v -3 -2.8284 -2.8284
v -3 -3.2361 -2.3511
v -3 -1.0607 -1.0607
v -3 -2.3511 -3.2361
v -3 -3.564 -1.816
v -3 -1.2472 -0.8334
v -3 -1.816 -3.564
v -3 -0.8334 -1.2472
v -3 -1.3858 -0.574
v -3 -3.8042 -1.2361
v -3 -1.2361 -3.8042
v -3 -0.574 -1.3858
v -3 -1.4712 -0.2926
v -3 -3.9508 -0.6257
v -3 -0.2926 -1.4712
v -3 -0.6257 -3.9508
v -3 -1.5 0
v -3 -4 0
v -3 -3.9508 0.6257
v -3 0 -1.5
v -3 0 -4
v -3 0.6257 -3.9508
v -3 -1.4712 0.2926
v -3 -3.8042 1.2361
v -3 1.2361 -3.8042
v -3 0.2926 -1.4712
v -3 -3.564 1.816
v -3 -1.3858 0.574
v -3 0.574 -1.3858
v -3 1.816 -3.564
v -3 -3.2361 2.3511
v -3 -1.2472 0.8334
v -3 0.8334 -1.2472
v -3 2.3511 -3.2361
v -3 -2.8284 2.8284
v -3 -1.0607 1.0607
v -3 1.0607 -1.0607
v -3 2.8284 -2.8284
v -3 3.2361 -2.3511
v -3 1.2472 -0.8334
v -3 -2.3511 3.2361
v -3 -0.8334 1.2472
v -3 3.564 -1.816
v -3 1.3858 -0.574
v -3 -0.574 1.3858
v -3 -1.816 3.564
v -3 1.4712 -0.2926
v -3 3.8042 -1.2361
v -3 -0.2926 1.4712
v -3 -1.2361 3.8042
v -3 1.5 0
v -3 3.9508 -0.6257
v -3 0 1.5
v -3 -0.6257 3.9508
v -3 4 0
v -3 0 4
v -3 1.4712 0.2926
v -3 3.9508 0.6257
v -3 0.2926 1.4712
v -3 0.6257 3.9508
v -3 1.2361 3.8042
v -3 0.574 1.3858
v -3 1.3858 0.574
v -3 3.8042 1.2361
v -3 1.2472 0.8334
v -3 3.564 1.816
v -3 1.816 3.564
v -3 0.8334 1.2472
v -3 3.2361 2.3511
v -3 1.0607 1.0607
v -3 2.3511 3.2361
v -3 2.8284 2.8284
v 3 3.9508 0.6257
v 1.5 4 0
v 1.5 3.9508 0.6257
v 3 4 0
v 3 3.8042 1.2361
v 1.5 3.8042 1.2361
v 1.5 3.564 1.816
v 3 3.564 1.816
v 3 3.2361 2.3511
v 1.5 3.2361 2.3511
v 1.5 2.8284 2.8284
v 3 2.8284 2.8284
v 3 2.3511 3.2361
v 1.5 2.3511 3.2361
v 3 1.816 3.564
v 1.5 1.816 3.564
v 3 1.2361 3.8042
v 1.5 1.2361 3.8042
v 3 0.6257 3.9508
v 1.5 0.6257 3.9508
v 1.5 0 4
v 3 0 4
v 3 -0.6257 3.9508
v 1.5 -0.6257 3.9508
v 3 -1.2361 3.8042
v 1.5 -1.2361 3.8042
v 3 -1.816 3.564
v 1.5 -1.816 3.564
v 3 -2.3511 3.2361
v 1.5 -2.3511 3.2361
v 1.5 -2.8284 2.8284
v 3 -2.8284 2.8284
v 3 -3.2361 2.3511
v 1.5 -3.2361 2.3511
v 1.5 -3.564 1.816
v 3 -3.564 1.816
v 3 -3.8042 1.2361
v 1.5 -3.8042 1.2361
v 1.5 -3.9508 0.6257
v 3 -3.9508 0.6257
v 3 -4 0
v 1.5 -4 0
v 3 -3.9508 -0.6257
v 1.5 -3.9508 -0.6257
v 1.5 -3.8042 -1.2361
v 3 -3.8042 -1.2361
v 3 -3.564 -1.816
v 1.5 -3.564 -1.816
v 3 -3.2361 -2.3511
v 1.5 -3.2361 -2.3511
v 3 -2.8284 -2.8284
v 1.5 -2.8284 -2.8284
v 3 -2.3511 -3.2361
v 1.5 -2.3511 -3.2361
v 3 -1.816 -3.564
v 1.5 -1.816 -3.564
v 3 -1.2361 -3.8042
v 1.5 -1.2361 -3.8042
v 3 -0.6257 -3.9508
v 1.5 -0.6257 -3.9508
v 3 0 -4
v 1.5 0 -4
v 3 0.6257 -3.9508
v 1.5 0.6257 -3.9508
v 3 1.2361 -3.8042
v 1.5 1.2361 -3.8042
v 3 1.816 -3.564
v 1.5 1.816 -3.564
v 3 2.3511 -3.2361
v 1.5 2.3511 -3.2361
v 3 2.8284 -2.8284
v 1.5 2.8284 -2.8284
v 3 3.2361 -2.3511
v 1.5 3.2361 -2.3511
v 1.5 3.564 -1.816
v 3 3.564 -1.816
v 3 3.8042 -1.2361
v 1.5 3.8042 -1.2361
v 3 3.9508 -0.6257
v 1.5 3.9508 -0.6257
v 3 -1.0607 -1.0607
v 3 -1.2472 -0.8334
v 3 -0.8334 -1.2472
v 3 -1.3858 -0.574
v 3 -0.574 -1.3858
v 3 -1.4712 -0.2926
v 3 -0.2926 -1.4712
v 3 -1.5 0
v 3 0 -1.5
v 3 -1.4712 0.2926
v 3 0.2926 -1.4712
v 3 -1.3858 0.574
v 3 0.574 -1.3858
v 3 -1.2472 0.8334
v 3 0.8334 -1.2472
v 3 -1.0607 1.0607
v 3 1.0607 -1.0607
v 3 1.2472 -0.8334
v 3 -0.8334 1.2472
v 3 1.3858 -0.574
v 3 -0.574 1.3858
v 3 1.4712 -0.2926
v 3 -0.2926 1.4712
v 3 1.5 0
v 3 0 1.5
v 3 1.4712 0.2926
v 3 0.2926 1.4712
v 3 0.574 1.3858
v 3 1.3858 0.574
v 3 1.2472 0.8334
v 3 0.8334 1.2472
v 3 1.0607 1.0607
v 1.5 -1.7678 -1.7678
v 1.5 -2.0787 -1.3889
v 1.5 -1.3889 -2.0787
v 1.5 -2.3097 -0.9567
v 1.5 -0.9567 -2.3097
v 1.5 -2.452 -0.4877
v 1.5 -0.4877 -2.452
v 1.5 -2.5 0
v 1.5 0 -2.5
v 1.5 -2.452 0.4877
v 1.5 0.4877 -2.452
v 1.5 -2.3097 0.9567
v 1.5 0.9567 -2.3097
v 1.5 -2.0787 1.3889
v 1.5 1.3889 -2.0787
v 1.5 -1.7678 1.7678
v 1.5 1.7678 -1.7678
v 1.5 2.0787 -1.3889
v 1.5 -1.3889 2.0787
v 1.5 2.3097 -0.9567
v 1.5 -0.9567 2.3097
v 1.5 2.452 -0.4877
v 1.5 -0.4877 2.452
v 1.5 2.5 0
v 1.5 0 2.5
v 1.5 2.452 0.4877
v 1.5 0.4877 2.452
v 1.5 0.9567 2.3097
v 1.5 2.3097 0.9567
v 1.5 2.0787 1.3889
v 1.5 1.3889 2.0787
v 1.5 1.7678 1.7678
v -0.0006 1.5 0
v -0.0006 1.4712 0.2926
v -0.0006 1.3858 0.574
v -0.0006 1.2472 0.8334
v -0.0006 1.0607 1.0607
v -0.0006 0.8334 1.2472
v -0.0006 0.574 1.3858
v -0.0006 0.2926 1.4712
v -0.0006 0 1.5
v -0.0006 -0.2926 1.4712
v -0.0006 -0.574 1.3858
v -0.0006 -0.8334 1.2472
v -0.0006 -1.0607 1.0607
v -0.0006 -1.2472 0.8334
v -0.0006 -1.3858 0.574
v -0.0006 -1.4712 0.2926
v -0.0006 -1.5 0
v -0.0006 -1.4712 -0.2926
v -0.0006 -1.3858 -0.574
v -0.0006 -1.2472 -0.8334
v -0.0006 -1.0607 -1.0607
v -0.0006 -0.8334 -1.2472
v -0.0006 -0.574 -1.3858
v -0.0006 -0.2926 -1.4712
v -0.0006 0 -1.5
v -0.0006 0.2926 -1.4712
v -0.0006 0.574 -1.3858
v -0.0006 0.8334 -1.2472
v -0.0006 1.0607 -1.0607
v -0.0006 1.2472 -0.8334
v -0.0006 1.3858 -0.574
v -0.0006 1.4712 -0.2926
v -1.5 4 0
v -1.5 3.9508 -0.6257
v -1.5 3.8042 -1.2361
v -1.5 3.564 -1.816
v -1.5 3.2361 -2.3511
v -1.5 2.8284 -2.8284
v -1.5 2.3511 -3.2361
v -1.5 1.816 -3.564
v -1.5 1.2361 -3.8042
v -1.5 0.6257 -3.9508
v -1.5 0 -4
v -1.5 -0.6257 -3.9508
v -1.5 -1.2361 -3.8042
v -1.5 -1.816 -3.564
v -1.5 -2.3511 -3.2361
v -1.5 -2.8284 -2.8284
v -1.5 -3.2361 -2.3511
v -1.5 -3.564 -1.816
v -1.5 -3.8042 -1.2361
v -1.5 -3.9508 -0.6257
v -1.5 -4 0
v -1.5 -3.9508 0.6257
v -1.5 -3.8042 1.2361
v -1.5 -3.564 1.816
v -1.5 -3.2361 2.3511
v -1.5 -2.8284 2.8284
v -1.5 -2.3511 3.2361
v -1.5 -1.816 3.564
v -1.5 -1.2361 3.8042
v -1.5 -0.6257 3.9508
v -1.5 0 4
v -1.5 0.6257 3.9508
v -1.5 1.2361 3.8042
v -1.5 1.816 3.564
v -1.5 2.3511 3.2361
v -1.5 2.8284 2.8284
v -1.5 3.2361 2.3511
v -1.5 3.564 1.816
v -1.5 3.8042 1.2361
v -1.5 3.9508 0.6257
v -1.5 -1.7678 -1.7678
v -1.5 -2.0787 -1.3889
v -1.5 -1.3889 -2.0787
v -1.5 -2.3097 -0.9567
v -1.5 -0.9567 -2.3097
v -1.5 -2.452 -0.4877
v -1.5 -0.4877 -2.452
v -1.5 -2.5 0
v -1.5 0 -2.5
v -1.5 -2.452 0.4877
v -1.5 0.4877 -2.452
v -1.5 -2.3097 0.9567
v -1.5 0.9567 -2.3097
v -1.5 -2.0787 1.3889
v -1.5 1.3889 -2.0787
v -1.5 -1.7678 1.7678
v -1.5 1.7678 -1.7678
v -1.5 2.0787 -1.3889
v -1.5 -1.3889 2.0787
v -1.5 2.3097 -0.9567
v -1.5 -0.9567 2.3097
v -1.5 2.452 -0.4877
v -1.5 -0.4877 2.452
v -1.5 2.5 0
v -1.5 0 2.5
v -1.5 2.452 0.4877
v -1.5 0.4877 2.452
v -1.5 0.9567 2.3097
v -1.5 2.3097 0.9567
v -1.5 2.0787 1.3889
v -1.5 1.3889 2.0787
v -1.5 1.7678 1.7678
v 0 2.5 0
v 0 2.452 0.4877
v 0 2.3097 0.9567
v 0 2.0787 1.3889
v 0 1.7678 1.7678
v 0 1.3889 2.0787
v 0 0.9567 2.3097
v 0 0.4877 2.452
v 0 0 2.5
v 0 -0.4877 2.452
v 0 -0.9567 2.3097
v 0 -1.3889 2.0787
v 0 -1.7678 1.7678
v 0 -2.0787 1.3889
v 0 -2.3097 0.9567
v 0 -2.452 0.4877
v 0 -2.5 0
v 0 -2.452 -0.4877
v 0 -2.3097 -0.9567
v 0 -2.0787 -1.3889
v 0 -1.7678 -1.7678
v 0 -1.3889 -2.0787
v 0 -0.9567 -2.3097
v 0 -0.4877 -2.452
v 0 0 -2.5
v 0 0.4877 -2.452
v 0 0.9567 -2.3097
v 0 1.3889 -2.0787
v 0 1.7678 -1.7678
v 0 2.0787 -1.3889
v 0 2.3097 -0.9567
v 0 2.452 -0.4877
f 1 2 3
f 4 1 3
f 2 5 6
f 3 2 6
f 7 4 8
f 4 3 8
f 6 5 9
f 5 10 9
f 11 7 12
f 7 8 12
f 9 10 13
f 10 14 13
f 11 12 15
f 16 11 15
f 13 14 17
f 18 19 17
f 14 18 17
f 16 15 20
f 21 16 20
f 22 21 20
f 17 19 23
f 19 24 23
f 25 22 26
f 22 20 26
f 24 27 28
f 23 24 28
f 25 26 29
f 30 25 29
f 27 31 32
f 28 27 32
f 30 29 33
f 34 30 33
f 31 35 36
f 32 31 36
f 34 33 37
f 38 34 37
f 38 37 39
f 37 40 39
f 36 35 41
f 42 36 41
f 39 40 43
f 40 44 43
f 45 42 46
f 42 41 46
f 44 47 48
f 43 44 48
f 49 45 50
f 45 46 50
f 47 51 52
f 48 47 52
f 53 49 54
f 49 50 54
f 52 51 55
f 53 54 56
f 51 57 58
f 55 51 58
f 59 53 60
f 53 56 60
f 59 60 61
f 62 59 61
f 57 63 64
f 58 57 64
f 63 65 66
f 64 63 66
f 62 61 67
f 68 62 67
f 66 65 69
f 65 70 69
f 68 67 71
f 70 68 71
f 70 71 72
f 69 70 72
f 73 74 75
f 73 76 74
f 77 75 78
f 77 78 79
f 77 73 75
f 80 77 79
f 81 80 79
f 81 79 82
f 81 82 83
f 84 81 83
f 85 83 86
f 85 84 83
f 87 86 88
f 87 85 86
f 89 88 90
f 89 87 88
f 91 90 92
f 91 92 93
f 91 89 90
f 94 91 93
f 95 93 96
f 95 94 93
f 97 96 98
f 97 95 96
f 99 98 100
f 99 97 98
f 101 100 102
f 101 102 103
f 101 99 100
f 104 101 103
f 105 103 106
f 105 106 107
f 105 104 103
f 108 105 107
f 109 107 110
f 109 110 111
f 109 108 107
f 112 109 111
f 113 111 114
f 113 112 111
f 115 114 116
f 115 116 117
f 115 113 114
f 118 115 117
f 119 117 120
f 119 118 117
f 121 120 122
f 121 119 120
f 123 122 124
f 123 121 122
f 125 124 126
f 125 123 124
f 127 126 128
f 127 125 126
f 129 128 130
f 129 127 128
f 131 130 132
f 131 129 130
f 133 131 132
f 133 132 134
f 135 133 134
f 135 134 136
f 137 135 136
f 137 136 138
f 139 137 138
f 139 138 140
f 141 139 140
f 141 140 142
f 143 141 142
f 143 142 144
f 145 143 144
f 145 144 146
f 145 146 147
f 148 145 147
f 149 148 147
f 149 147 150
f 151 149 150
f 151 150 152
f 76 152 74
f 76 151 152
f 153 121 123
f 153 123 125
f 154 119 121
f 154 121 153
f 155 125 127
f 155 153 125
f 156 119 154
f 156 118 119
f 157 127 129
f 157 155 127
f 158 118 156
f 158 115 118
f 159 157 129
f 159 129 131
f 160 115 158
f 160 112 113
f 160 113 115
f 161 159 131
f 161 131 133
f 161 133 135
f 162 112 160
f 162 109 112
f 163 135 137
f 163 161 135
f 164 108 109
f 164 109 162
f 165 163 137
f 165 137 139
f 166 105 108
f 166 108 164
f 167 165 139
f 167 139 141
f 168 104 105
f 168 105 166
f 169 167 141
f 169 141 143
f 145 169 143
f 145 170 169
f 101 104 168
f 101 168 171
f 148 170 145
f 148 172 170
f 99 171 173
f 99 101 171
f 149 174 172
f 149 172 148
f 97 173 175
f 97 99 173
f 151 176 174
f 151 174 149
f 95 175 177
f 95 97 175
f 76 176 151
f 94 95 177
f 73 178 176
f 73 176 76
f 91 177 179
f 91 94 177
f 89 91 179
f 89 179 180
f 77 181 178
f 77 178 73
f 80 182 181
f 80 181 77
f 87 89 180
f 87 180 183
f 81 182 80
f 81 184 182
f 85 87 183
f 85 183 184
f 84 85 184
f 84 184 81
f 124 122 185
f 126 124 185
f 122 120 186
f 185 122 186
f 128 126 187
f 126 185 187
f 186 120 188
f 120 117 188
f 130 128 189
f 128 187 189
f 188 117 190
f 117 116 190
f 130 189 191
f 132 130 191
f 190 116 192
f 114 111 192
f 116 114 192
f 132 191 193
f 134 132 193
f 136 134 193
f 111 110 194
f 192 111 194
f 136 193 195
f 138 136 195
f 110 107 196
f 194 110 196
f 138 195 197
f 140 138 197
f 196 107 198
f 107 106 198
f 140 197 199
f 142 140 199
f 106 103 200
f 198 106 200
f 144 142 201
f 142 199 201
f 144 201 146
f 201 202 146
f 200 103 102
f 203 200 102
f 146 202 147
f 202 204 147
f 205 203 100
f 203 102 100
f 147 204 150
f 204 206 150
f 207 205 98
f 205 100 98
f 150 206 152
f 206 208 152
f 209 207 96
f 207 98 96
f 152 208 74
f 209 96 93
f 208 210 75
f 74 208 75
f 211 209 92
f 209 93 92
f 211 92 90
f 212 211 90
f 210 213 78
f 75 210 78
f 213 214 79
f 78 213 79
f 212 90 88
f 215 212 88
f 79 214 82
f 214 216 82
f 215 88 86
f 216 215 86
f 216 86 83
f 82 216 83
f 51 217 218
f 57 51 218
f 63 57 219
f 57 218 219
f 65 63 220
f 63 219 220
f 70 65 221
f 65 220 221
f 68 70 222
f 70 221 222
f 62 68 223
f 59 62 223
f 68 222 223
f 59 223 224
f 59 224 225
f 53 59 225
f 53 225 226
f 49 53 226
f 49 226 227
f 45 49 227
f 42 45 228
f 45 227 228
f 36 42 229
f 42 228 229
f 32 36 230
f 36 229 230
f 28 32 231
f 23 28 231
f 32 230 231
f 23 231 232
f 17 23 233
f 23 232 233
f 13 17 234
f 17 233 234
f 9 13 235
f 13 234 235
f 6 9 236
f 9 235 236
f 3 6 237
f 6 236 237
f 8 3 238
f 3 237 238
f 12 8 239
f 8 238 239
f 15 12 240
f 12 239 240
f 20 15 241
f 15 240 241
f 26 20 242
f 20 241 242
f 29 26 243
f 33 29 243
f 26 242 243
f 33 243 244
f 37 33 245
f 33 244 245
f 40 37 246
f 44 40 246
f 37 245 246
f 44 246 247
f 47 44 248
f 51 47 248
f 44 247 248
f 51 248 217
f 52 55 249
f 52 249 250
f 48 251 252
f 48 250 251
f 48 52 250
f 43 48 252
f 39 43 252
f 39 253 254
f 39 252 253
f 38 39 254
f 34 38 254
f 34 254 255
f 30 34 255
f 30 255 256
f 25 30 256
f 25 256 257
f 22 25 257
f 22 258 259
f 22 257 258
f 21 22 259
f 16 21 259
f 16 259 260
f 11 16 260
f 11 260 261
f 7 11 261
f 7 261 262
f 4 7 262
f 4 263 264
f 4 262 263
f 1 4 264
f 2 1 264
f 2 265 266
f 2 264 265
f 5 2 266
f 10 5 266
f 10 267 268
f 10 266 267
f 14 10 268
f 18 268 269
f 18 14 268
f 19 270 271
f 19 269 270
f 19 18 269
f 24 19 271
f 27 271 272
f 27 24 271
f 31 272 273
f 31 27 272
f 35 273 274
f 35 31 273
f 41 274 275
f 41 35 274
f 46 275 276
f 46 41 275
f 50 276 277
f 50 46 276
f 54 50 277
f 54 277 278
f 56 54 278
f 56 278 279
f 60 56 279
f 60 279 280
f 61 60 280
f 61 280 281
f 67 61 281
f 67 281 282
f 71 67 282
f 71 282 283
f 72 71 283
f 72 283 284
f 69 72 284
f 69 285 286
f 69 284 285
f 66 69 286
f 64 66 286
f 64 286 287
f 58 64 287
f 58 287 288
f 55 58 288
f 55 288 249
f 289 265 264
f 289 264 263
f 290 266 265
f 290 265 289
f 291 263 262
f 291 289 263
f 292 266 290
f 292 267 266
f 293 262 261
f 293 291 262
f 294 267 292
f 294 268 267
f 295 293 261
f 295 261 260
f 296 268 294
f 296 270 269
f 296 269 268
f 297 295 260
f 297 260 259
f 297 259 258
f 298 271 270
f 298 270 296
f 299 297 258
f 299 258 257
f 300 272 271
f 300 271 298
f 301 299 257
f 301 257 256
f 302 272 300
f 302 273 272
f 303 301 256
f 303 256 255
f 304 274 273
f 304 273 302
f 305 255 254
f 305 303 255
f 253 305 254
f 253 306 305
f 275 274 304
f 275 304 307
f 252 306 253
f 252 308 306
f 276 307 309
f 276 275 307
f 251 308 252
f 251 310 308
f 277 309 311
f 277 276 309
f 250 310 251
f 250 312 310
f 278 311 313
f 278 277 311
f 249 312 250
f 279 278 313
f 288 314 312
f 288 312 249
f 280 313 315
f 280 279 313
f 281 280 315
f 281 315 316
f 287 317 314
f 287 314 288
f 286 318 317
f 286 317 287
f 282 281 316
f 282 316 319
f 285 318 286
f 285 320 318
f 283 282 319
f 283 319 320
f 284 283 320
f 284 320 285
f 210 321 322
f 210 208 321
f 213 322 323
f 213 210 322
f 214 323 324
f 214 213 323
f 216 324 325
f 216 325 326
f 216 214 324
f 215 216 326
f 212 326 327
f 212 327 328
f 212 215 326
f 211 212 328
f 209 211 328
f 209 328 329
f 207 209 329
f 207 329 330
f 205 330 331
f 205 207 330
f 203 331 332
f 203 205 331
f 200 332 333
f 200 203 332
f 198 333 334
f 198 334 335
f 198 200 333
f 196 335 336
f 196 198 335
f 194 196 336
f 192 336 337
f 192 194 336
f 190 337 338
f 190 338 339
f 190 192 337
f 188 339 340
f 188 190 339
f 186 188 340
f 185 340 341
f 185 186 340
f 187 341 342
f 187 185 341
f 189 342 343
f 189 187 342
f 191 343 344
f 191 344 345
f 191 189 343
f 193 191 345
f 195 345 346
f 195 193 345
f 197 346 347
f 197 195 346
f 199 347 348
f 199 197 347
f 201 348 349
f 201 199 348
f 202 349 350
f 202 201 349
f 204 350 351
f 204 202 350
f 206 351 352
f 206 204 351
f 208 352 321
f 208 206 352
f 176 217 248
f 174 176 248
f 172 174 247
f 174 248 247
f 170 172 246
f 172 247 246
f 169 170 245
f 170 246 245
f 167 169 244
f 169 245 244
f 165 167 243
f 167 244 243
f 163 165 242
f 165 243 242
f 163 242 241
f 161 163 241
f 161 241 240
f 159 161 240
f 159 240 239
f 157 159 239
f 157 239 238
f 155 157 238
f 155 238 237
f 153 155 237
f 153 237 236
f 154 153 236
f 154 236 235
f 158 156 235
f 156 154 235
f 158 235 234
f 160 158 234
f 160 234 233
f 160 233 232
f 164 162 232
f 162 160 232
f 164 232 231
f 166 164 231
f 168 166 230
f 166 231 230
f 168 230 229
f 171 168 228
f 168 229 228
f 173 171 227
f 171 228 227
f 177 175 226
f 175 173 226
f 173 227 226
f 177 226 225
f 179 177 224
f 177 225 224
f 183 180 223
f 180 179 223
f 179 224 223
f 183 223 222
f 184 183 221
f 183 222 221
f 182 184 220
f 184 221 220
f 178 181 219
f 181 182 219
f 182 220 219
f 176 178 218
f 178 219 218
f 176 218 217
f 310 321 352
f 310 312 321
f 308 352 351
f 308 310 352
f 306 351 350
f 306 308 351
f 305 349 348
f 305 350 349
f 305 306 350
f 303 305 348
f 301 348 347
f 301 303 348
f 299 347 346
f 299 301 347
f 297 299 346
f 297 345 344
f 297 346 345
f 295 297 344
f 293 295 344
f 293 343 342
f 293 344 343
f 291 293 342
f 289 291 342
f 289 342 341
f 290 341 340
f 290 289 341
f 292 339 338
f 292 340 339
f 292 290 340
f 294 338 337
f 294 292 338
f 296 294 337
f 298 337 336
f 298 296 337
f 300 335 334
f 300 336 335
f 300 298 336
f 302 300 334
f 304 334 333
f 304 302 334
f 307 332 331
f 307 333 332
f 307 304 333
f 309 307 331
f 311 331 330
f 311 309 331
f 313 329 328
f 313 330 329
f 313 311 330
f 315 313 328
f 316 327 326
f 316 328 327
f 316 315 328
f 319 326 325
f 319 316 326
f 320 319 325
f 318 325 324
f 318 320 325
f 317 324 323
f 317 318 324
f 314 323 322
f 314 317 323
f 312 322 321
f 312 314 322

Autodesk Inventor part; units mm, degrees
ref_plane "YZ Plane" through (0, 0, 0) normal (1, 0, 0) x (0, 1, 0)
ref_plane "XZ Plane" through (0, 0, 0) normal (0, 1, 0) x (-1, 0, 0)
ref_plane "XY Plane" through (0, 0, 0) normal (0, 0, 1) x (1, 0, 0)
sketch "スケッチ1" plane through (0, 0, 0) normal (0, 0, 1) x (1, 0, 0)
  line L0 (0, 2.5) -> (1.5, 2.5)
  line L1 (1.5, 2.5) -> (1.5, 4)
  line L2 (1.5, 4) -> (3, 4)
  line L3 (3, 4) -> (3, 1.5)
  line L4 (3, 1.5) -> (-0.0006, 1.5)
  line L5 (0, -0.8) -> (0, 4.8) construction
  line L6 (0, 2.5) -> (-1.5, 2.5)
  line L7 (-1.5, 2.5) -> (-1.5, 4)
  line L8 (-1.5, 4) -> (-3, 4)
  line L9 (-3, 4) -> (-3, 1.5)
  line L10 (-3, 1.5) -> (0.0006, 1.5)
  line L11 (-4.2, 0) -> (4.2, 0) projected
  point P0 (0, 0)
  point P1 (-0.0006, 1.5)
  dimension "d0" = 1.5
  dimension "d1" = 2.5
  dimension "d2" = 1.5
  dimension "d3" = 1.5
  dimension "d4" = 1.5
revolve "回転1" add sketch "スケッチ1" angle 360 about axis through (-10, 0, 0) along (1, 0, 0)
properties part number "Pulley_D3_P6"
